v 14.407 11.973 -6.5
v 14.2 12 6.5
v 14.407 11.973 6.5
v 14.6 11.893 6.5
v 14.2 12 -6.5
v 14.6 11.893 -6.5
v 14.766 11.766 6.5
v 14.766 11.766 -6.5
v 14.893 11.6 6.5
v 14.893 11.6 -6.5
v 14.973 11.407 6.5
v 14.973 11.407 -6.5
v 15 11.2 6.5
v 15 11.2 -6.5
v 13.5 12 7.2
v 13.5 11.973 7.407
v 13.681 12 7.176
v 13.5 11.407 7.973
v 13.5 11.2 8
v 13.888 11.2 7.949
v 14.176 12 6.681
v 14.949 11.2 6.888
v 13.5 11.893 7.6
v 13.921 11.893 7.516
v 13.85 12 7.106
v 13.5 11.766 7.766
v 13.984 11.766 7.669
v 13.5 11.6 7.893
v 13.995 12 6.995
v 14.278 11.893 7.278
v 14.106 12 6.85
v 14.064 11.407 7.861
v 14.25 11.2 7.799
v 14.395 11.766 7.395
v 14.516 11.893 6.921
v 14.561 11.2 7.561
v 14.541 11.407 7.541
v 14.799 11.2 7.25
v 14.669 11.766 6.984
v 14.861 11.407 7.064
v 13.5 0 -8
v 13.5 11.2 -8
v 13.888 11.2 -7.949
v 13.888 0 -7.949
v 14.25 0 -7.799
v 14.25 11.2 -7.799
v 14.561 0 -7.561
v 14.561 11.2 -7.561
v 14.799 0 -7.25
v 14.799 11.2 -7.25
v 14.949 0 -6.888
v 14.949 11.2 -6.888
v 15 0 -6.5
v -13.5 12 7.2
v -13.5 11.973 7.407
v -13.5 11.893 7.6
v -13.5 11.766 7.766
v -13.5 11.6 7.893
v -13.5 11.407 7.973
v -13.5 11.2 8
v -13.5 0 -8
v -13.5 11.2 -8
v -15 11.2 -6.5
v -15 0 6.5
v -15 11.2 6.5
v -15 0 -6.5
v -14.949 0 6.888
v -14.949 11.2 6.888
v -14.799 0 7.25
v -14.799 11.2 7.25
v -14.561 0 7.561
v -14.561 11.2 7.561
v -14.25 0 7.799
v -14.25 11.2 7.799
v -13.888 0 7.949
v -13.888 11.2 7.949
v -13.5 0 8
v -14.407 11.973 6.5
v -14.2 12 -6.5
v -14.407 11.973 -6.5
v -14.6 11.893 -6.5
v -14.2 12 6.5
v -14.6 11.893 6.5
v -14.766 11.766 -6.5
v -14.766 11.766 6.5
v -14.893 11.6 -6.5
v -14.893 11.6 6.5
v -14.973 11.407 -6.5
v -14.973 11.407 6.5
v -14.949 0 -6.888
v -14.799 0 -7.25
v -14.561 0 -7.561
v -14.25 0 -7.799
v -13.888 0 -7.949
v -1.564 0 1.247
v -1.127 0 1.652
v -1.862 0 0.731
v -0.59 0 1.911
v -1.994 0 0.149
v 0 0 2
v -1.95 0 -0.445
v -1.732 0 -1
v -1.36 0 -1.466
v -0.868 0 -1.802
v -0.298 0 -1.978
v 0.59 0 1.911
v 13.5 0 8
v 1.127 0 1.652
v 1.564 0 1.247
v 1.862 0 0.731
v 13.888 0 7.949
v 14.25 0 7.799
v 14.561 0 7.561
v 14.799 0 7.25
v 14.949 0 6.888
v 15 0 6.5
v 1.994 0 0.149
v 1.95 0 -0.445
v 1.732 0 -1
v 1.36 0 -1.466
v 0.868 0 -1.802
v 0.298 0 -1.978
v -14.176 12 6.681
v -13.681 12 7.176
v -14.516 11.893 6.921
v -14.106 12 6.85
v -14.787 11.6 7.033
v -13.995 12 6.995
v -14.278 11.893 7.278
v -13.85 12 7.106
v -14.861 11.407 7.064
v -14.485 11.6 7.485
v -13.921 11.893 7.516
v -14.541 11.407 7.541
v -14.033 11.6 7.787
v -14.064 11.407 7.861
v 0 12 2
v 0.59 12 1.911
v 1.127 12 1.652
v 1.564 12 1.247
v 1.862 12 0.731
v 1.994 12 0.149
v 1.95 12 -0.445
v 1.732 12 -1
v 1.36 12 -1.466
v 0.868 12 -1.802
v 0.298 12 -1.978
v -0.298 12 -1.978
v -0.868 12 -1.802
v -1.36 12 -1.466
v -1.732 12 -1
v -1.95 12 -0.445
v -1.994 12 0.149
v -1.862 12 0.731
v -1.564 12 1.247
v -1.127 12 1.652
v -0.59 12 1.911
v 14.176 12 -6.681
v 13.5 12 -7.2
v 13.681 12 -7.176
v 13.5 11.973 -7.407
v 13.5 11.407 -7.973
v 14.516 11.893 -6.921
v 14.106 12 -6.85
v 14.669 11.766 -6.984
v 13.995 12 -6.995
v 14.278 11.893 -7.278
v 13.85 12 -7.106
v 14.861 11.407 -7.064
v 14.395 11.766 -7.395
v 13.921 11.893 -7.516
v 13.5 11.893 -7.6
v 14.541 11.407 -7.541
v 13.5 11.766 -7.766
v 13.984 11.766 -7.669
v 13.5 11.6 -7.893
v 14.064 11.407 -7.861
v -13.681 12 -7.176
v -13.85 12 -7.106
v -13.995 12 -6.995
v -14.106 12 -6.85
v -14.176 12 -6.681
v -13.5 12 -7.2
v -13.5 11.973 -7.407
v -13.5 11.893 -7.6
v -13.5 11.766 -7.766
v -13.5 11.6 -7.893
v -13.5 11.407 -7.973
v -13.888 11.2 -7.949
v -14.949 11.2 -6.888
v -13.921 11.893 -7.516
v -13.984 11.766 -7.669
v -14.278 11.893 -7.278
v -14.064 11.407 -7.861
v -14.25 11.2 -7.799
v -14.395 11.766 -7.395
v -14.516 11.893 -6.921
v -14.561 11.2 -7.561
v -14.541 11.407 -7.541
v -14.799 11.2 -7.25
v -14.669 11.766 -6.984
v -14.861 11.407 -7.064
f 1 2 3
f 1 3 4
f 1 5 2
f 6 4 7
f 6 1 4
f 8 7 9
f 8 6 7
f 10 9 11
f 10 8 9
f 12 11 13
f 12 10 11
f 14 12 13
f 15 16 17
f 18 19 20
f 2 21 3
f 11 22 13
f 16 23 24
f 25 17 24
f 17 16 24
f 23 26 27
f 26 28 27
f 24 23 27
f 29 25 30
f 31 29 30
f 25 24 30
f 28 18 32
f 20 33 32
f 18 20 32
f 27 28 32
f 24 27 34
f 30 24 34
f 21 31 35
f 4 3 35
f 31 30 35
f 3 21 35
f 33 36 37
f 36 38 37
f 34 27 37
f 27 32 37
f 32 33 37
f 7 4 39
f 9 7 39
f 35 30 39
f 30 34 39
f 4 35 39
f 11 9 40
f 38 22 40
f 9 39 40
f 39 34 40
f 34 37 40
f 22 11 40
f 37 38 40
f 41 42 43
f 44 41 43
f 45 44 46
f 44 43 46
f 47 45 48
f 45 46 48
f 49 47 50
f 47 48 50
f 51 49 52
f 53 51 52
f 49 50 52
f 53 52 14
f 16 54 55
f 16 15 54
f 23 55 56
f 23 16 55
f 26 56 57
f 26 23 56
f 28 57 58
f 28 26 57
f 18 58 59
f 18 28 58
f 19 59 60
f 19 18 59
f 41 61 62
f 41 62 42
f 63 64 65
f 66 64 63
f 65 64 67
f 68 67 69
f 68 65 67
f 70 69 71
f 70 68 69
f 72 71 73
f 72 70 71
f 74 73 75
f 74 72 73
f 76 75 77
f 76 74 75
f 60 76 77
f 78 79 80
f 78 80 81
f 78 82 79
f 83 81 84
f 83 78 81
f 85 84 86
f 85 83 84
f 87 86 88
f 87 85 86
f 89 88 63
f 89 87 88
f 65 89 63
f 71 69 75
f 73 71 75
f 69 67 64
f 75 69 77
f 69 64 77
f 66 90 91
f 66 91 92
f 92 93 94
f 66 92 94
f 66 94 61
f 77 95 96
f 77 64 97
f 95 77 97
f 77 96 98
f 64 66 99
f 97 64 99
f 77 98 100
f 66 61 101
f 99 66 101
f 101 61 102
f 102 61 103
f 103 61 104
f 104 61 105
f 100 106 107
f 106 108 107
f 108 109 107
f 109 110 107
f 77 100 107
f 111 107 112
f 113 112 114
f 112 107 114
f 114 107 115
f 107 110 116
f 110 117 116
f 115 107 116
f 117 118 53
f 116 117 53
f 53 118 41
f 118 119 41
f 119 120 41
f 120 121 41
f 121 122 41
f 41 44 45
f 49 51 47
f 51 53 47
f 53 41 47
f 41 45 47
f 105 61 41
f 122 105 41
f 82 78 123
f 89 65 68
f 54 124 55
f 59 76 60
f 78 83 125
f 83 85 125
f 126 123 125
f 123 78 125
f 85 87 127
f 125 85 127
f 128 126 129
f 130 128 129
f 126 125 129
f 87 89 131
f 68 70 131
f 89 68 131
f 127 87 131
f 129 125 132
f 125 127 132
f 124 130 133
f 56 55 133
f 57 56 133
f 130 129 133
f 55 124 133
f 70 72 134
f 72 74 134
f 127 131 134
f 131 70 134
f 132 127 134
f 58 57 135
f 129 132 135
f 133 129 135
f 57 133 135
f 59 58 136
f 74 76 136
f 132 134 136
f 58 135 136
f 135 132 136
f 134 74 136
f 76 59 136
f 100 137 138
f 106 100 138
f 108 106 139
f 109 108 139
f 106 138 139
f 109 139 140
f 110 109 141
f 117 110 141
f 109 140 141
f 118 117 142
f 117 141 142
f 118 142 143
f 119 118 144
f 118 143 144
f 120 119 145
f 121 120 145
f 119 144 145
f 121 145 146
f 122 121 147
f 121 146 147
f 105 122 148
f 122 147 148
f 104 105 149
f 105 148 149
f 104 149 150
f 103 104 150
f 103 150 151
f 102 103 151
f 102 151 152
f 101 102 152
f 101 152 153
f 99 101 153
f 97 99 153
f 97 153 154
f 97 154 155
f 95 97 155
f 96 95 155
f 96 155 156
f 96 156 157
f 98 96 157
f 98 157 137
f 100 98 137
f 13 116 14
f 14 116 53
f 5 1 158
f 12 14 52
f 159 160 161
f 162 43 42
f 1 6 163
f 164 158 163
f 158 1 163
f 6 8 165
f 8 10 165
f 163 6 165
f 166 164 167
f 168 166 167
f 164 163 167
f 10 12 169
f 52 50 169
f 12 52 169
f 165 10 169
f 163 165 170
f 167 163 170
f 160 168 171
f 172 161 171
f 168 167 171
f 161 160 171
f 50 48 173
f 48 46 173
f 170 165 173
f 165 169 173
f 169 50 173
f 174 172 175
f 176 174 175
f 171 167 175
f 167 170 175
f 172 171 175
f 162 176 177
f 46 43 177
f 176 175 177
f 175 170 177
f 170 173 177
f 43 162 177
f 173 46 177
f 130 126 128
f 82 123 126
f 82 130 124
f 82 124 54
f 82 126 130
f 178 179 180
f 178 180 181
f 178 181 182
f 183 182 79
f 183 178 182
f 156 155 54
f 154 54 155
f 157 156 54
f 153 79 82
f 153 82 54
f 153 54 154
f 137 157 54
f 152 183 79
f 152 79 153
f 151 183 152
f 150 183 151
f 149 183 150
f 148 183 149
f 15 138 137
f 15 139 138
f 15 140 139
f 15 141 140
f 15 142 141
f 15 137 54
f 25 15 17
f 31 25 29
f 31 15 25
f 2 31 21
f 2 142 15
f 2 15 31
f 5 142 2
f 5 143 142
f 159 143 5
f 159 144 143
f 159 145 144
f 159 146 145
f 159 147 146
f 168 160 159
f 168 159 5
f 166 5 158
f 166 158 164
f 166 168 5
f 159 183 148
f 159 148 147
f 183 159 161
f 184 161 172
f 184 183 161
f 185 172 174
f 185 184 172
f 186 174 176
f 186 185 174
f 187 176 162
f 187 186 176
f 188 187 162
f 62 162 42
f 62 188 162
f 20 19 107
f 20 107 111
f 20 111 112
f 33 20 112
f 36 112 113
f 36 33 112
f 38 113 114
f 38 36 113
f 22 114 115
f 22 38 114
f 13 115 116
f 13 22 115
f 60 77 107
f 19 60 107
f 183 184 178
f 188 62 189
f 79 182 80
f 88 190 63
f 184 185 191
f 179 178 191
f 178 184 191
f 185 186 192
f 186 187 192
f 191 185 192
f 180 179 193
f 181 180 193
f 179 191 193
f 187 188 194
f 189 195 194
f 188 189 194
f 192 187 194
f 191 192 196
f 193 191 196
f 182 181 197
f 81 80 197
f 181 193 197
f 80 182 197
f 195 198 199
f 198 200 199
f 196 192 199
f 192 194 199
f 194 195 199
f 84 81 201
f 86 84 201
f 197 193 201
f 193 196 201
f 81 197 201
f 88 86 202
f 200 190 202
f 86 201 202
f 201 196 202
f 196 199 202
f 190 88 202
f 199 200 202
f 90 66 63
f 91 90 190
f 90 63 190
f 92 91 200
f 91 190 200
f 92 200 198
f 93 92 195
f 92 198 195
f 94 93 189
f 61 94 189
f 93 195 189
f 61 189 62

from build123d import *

# Parameters (mm, degrees)
SKETCH2_W           = 30
SKETCH2_H           = 16
BOSS_EXTRUDE1_DEPTH = 12
SKETCH3_R           = 2
CUT_EXTRUDE1_DEPTH  = 21.808652047
FILLET1_R           = 1.5
FILLET2_R           = 0.8


with BuildPart() as part:
    # Sketch2 → Boss-Extrude1 (new body)
    with BuildSketch(Plane(origin=(0, 0, 0), x_dir=(1, 0, 0), z_dir=(0, 1, 0))):
        Rectangle(SKETCH2_W, SKETCH2_H)
    extrude(amount=BOSS_EXTRUDE1_DEPTH)

    # Sketch3 → Cut-Extrude1 (cut, through all)
    with BuildSketch(Plane(origin=(0, 12, 0), x_dir=(1, 0, 0), z_dir=(0, 1, 0))):
        with Locations(Location((0, 0, 0), (0, 0, 270))):
            Circle(SKETCH3_R)
    extrude(amount=-CUT_EXTRUDE1_DEPTH, mode=Mode.SUBTRACT)

    # Fillet1
    fillet1_edges = [part.edges().sort_by_distance(p)[0] for p in [
        (15, 6, 8),
        (-15, 6, 8),
        (-15, 6, -8),
        (15, 6, -8),
    ]]
    fillet(fillet1_edges, radius=FILLET1_R)

    # Fillet2
    fillet2_edges = [part.edges().sort_by_distance(p)[0] for p in [
        (0, 12, 8),
        (-15, 12, 0),
        (15, 12, 0),
        (0, 12, -8),
        (14.560660172, 12, 7.560660172),
        (14.560660172, 12, -7.560660172),
        (-14.560660172, 12, -7.560660172),
        (-14.560660172, 12, 7.560660172),
    ]]
    fillet(fillet2_edges, radius=FILLET2_R)


solid = part.part
